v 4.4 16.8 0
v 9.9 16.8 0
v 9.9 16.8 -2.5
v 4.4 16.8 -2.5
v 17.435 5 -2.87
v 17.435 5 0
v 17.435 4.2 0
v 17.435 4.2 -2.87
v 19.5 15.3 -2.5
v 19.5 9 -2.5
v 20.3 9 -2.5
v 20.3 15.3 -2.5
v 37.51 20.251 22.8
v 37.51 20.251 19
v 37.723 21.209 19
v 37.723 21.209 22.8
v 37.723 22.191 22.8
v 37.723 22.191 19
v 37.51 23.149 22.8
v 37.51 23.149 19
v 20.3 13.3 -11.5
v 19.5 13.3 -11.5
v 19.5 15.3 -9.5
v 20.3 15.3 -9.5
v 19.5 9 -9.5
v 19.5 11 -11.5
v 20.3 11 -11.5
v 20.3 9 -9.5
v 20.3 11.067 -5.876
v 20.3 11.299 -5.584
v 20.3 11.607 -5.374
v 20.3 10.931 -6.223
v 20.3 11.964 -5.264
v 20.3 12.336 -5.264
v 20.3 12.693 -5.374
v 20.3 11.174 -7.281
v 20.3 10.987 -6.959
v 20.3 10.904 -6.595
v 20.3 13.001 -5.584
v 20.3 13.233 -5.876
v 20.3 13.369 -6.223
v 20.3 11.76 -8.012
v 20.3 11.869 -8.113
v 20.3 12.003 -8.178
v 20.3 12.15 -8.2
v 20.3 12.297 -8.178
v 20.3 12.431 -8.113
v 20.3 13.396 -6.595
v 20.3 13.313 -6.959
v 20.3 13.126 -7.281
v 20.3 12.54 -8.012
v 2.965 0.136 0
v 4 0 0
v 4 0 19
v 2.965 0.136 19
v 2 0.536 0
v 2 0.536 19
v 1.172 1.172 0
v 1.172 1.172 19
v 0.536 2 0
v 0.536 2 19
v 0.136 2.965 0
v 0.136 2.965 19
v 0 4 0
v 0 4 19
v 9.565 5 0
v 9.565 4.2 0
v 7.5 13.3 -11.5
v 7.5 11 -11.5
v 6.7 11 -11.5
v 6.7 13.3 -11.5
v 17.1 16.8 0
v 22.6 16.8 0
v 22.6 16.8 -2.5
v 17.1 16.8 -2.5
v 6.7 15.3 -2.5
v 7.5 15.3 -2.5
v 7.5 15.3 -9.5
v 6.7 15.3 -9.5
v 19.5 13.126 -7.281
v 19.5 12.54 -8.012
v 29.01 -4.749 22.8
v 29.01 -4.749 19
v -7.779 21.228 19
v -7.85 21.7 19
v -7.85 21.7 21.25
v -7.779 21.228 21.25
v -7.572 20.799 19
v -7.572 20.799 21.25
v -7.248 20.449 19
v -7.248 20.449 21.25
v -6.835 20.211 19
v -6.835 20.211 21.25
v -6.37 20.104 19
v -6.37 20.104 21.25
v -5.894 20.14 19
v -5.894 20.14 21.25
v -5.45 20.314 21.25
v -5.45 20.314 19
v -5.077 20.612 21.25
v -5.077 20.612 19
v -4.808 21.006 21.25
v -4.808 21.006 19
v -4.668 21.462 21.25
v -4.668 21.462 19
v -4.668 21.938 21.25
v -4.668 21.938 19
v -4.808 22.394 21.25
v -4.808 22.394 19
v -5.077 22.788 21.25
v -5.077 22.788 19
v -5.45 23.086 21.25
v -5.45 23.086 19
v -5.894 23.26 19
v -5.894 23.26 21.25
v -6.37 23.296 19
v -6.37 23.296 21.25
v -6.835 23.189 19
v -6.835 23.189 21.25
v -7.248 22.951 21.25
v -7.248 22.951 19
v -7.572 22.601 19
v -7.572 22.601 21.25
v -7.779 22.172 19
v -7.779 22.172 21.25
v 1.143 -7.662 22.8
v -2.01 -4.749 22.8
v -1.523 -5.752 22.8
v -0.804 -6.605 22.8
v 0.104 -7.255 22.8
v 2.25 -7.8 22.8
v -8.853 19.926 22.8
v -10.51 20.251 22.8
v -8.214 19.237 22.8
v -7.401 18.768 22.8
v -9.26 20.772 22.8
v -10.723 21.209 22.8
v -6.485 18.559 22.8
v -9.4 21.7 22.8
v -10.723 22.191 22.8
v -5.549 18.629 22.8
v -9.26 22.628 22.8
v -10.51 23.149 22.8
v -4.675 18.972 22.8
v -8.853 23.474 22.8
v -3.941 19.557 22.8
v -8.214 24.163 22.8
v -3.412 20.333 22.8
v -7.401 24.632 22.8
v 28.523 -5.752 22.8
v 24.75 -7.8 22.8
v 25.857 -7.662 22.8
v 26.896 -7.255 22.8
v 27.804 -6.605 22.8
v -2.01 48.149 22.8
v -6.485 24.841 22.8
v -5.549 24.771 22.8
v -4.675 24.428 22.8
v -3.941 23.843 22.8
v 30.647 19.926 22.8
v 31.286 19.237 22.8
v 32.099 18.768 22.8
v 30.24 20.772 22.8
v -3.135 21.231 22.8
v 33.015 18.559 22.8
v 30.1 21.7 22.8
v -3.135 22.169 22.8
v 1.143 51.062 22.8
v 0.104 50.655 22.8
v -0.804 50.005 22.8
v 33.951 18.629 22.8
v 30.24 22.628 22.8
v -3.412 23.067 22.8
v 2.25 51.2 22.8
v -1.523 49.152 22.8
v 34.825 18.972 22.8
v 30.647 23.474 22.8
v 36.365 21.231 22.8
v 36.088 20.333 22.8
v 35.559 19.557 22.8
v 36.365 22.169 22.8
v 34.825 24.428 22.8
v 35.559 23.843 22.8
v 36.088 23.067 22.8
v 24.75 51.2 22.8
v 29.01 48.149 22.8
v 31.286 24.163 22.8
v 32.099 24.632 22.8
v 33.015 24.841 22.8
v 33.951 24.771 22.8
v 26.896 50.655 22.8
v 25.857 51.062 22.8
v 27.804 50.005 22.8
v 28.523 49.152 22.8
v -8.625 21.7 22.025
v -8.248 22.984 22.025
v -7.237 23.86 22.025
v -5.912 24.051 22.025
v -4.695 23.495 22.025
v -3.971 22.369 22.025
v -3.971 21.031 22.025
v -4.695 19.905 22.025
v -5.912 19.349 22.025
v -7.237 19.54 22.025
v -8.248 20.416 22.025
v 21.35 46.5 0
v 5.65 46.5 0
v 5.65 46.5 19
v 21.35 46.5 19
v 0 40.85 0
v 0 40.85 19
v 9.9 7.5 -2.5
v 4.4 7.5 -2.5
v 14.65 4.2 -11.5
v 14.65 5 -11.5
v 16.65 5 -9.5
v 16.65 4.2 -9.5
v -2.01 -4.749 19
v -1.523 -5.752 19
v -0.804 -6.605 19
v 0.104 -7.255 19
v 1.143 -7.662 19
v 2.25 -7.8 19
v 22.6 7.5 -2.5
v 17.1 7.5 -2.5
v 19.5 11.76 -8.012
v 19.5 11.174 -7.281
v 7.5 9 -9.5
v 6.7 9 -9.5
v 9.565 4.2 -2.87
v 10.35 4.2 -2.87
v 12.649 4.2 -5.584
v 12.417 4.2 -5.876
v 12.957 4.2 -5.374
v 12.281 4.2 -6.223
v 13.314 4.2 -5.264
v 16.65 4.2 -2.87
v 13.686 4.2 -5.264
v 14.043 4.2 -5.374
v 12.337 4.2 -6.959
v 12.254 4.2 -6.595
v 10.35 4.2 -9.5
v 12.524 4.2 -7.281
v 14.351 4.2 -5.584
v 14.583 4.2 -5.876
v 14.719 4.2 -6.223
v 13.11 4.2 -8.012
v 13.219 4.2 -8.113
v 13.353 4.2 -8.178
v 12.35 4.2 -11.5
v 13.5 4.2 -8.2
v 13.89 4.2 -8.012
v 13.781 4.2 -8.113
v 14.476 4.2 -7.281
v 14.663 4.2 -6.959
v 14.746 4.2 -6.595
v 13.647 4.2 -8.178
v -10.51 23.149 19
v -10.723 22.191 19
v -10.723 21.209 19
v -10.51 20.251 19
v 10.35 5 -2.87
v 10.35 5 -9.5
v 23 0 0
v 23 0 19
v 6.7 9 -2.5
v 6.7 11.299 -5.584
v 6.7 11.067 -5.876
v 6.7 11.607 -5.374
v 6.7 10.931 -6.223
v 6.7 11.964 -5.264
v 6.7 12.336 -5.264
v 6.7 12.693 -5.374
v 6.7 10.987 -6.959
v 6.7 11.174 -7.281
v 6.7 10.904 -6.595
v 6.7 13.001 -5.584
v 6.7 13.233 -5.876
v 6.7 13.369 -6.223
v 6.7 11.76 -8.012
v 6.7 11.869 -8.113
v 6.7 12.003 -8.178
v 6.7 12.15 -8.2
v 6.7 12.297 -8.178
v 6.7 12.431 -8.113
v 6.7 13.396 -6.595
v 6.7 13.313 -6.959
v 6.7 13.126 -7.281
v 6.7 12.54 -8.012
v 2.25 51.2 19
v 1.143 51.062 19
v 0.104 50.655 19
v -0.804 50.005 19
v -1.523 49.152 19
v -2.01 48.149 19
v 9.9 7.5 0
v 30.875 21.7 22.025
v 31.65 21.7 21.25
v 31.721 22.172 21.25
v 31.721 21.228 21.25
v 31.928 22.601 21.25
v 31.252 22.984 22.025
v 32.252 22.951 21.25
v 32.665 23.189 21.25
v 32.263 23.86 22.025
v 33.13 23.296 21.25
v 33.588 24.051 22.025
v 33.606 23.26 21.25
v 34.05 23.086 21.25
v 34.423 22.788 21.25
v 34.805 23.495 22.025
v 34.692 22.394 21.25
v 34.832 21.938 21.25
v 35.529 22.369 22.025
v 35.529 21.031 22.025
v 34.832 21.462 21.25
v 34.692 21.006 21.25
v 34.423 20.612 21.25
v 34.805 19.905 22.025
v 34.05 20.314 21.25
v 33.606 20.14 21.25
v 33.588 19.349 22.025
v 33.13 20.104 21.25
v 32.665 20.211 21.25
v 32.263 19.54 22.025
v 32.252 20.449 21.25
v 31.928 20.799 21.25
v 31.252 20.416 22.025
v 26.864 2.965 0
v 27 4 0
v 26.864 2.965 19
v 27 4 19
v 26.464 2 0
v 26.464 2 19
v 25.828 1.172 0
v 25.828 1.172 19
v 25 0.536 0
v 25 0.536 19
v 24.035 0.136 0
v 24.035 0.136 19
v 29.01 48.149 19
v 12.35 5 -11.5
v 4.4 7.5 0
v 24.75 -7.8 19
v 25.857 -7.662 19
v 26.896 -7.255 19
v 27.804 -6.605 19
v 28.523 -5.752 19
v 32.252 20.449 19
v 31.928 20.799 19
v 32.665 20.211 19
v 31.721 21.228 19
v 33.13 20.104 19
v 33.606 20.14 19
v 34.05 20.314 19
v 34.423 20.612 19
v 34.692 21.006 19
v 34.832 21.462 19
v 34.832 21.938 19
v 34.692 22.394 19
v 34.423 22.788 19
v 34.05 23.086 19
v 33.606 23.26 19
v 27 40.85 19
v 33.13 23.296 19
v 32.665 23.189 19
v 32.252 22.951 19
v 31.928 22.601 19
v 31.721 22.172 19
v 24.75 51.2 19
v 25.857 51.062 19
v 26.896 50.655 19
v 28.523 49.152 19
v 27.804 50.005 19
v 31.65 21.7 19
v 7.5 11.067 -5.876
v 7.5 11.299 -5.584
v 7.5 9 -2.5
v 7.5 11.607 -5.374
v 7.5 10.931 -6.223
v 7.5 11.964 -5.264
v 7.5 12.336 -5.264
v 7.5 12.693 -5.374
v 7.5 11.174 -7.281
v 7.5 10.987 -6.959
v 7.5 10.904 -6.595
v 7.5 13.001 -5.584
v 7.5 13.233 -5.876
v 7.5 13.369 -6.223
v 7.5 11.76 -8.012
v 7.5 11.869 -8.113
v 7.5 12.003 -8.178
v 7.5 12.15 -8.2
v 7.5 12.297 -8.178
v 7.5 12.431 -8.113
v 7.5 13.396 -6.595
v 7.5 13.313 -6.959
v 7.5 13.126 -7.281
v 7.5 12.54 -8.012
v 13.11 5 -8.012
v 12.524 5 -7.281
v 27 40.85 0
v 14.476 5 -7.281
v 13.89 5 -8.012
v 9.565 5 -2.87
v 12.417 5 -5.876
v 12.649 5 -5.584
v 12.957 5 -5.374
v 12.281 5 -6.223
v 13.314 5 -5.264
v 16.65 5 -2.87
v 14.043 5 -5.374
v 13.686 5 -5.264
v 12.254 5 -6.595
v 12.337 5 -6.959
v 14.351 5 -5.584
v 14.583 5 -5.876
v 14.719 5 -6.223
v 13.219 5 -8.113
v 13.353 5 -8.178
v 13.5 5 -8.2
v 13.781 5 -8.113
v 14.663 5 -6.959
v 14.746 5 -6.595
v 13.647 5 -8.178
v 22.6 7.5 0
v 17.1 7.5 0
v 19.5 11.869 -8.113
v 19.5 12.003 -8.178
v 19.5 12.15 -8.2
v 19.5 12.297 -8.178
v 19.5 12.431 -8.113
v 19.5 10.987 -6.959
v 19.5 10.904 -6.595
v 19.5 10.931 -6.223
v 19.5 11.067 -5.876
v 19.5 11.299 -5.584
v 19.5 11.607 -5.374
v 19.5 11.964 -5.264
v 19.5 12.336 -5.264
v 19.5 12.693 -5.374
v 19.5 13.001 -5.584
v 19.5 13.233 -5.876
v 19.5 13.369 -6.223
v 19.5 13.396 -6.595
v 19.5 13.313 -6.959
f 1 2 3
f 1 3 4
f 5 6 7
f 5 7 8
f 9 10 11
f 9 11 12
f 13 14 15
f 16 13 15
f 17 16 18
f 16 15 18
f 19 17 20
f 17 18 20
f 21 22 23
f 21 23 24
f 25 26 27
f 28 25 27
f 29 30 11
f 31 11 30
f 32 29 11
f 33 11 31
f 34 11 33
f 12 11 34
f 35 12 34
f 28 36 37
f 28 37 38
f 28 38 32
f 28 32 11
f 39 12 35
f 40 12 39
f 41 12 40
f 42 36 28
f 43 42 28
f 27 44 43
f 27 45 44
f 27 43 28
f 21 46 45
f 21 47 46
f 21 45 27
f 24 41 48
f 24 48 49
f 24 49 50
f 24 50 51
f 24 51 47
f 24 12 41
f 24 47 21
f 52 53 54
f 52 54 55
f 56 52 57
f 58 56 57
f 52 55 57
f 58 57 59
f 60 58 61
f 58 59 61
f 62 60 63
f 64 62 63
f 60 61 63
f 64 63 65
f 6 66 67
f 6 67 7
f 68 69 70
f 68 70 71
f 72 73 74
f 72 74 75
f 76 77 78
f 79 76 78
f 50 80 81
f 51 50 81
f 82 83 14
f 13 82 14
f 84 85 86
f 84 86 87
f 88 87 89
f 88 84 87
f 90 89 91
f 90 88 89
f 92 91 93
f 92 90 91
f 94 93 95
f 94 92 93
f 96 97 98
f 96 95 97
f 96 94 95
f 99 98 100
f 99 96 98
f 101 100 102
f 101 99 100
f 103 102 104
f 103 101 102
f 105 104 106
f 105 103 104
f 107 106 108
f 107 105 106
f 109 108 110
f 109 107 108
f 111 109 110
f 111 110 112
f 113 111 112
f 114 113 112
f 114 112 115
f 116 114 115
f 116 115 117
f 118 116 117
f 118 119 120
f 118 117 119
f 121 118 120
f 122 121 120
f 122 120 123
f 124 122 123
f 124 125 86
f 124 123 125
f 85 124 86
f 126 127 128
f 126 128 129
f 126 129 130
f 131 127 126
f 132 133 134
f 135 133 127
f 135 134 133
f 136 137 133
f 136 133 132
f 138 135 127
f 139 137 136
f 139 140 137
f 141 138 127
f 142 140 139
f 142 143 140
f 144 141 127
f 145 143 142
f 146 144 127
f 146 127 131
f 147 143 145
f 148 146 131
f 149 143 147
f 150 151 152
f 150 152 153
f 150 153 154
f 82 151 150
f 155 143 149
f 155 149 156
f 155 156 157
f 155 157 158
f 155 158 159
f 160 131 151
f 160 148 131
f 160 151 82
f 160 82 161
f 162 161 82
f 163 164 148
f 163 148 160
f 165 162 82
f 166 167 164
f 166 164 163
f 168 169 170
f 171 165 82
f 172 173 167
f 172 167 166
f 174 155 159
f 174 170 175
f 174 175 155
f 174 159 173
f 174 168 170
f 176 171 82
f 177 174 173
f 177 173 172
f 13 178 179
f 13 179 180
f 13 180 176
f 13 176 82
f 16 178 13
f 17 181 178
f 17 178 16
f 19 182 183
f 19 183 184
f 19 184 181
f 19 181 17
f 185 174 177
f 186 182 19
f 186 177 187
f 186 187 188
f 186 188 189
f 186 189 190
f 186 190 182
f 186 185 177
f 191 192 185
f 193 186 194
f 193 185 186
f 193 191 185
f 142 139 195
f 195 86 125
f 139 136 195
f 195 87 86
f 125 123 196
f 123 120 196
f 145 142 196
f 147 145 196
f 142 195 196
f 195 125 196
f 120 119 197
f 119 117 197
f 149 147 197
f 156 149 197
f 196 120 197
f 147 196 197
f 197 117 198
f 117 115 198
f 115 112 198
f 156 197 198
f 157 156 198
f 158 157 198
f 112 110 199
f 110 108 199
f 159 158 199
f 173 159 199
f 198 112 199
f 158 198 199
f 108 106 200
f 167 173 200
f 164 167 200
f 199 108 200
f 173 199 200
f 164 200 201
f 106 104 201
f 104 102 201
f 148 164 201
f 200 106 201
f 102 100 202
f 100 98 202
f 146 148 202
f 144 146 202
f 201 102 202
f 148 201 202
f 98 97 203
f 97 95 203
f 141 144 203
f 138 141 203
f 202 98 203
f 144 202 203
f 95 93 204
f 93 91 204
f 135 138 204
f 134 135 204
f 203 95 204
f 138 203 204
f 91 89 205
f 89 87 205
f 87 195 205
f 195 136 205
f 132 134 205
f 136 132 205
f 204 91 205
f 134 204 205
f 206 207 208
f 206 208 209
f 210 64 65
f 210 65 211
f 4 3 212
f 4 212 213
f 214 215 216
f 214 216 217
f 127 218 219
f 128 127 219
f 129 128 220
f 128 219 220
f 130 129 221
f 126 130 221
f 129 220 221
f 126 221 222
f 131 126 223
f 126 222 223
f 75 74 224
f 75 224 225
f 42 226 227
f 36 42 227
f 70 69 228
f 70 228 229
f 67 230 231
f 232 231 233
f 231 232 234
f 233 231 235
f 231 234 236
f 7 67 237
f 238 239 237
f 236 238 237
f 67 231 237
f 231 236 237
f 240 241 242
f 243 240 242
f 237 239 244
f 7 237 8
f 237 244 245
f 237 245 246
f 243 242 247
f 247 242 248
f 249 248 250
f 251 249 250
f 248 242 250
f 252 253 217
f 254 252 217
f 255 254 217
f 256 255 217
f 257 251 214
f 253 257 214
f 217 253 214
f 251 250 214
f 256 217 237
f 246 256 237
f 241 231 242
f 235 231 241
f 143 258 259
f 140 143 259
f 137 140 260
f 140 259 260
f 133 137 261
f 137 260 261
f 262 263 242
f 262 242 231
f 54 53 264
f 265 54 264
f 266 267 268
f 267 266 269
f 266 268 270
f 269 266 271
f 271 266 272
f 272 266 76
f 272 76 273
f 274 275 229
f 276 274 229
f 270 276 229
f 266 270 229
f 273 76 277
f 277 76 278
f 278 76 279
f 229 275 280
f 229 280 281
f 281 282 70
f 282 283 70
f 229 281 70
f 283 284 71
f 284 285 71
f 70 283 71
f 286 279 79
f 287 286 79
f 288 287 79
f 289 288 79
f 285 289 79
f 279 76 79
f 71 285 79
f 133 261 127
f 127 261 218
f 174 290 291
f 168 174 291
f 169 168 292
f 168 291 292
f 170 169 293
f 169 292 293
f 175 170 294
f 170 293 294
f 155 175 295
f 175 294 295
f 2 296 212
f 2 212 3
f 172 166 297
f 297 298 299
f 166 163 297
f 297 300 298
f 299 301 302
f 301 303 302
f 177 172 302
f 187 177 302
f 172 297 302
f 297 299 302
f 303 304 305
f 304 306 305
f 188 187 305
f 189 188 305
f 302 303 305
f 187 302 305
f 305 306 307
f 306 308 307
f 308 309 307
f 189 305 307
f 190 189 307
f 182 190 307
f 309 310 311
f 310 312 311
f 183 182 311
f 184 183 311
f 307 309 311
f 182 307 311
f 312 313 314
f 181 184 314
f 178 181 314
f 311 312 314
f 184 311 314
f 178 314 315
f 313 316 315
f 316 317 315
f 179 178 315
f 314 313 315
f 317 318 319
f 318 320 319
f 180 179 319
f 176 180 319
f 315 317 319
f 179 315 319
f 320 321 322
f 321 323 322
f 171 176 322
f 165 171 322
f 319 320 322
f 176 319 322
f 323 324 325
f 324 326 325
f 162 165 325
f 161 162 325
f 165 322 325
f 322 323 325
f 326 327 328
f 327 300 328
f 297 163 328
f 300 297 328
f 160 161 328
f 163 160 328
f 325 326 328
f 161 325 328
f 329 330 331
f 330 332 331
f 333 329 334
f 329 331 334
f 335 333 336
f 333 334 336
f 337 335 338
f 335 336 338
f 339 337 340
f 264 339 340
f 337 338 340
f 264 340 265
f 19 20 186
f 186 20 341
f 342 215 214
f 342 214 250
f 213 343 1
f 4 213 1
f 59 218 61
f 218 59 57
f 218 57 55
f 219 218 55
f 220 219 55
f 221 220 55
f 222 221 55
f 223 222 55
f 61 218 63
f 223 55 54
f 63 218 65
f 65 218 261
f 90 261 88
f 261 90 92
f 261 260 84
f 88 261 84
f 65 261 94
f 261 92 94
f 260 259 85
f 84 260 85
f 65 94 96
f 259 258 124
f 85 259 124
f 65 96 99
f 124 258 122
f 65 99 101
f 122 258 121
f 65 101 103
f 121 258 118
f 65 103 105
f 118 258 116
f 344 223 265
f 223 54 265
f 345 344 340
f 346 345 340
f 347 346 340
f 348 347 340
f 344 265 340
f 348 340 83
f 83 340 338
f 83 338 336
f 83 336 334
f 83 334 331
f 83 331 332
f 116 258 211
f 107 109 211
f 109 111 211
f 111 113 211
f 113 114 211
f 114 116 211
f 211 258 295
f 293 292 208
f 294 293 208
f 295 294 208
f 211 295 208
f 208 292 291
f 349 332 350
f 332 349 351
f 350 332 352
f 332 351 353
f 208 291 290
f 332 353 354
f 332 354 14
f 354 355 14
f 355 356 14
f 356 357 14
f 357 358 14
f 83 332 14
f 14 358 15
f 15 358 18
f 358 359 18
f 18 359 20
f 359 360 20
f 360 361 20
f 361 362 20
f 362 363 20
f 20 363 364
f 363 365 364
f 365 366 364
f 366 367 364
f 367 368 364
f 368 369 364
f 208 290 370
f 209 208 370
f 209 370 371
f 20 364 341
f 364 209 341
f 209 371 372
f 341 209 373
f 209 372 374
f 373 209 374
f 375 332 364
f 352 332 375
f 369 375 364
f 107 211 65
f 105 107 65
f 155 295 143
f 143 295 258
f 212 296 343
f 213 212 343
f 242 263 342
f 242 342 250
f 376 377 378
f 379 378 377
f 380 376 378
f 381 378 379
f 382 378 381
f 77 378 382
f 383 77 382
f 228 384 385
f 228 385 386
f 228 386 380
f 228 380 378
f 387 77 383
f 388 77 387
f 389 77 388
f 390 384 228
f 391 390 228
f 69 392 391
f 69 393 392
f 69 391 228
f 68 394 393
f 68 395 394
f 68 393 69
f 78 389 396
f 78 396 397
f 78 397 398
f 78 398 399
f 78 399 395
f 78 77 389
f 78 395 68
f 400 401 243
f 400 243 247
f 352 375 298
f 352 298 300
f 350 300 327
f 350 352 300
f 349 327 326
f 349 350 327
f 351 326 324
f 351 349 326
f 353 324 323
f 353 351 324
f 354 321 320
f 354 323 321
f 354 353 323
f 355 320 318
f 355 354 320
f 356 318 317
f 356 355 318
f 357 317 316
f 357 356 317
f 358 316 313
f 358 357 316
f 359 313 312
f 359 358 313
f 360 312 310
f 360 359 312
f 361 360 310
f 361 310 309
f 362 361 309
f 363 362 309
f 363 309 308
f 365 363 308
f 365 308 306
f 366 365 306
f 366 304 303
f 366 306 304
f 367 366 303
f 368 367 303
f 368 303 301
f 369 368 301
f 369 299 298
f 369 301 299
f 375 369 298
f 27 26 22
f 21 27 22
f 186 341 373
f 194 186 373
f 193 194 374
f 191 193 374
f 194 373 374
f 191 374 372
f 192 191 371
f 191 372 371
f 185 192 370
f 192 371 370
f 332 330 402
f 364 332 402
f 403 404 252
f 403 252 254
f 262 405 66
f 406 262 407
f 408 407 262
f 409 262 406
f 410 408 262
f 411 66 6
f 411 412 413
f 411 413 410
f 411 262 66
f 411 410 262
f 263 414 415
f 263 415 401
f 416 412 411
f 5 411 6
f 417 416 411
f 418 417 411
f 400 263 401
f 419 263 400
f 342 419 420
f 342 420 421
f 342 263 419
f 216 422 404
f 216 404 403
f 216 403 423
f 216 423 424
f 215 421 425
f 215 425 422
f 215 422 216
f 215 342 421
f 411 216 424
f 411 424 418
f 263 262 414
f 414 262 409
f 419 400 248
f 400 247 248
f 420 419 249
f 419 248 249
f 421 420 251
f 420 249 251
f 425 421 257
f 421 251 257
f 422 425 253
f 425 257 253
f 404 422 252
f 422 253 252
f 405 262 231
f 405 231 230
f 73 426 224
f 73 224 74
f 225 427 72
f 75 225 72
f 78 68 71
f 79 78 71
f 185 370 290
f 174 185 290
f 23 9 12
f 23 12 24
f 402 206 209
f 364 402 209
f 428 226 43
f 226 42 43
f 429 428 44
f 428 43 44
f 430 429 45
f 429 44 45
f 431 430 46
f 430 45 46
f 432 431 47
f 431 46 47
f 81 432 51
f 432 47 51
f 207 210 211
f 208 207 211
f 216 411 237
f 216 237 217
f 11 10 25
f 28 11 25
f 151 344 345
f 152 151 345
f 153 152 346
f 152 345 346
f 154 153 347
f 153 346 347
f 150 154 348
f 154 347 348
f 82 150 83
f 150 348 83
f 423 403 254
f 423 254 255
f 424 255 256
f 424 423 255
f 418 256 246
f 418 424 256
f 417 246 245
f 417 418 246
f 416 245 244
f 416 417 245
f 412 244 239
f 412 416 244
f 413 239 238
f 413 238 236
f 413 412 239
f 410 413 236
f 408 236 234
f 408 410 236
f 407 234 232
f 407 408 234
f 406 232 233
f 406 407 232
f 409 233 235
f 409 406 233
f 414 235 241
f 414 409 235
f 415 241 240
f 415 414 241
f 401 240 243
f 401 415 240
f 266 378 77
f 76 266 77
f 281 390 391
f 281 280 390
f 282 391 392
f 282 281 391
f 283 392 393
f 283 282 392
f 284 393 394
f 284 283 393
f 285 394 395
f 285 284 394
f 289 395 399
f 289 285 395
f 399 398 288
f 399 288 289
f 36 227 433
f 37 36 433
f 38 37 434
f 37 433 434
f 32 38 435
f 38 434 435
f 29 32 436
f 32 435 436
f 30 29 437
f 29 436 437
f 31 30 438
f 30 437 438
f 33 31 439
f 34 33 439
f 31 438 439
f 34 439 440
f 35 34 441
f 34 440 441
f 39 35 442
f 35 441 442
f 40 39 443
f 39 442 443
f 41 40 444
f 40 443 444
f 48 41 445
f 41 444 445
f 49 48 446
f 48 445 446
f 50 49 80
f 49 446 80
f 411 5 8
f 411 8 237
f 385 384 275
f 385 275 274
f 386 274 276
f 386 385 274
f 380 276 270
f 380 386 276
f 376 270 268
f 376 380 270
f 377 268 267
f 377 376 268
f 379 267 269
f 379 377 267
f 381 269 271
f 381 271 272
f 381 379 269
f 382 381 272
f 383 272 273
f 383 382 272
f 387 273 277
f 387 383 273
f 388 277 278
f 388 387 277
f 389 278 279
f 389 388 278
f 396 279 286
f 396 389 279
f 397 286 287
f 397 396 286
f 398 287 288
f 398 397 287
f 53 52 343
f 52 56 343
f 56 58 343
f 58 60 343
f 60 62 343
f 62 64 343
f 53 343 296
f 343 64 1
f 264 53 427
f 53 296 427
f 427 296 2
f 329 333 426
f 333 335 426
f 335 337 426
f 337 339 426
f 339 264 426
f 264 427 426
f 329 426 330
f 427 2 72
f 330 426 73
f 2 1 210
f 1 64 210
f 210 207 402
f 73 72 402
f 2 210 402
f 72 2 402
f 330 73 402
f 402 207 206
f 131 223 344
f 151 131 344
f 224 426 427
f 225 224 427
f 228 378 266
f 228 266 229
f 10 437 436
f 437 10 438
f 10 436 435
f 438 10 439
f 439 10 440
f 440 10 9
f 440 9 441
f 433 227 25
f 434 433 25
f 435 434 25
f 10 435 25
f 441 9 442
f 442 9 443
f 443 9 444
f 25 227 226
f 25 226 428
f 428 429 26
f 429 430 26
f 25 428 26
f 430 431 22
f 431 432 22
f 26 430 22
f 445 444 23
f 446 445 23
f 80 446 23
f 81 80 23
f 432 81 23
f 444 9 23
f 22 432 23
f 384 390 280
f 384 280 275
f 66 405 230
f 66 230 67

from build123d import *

# Parameters (mm, degrees)
SKETCH1_W                                       = 27
SKETCH1_H                                       = 46.5
BOSS_EXTRUDE1_DEPTH                             = 19
SKETCH2_R                                       = 1.6
BOSS_EXTRUDE2_DEPTH                             = 3.8
CSK_FOR_M3_FLAT_HEAD_MACHINE_SCREW1_D           = 3.2
CSK_FOR_M3_FLAT_HEAD_MACHINE_SCREW1_CSINK_D     = 6.3
CSK_FOR_M3_FLAT_HEAD_MACHINE_SCREW1_CSINK_ANGLE = 90
SKETCH5_W                                       = 5.5
SKETCH5_H                                       = 9.3
BOSS_EXTRUDE3_DEPTH                             = 2.5
BOSS_EXTRUDE4_DEPTH                             = 0.8
CHAMFER1_SIZE                                   = 2
FILLET1_R                                       = 0.5
SKETCH7_W                                       = 9
SKETCH7_H                                       = 6.3
BOSS_EXTRUDE5_DEPTH                             = 0.8
CHAMFER2_SIZE                                   = 2
FILLET3_R                                       = 0.5
CHAMFER3_SIZE                                   = 5.65
FILLET2_R                                       = 4


with BuildPart() as part:
    # Sketch1 → Boss-Extrude1 (new body)
    with BuildSketch(Plane.XY):
        with Locations((13.5, 23.25)):
            Rectangle(SKETCH1_W, SKETCH1_H)
    extrude(amount=BOSS_EXTRUDE1_DEPTH)

    # Sketch2 → Boss-Extrude2 (add)
    with BuildSketch(Plane.XY.offset(19)):
        with BuildLine():
            Line((2.25, -7.8), (24.75, -7.8))
            ThreePointArc((24.75, -7.8), (27.370254725, -6.958451199), (29.010477352, -4.7485623))
            Line((29.010477352, -4.7485623), (37.510477352, 20.2514377))
            ThreePointArc((37.510477352, 20.2514377), (37.75, 21.7), (37.510477352, 23.1485623))
            Line((37.510477352, 23.1485623), (29.010477352, 48.1485623))
            ThreePointArc((29.010477352, 48.1485623), (27.370254725, 50.358451199), (24.75, 51.2))
            Line((24.75, 51.2), (2.25, 51.2))
            ThreePointArc((2.25, 51.2), (-0.370254725, 50.358451199), (-2.010477352, 48.1485623))
            Line((-2.010477352, 48.1485623), (-10.510477352, 23.1485623))
            ThreePointArc((-10.510477352, 23.1485623), (-10.75, 21.7), (-10.510477352, 20.2514377))
            Line((-10.510477352, 20.2514377), (-2.010477352, -4.7485623))
            ThreePointArc((-2.010477352, -4.7485623), (-0.370254725, -6.958451199), (2.25, -7.8))
        make_face()
        with Locations(Location((-6.25, 21.7, 0), (0, 0, 180))):
            Circle(SKETCH2_R, mode=Mode.SUBTRACT)
        with Locations(Location((33.25, 21.7, 0), (0, 0, 180))):
            Circle(SKETCH2_R, mode=Mode.SUBTRACT)
    extrude(amount=BOSS_EXTRUDE2_DEPTH)

    # CSK for M3 Flat Head Machine Screw1 (through all)
    with Locations(Plane.XY.offset(22.8)):
        with Locations((-6.25, 21.7), (33.25, 21.7)):
            CounterSinkHole(CSK_FOR_M3_FLAT_HEAD_MACHINE_SCREW1_D / 2, CSK_FOR_M3_FLAT_HEAD_MACHINE_SCREW1_CSINK_D / 2, counter_sink_angle=CSK_FOR_M3_FLAT_HEAD_MACHINE_SCREW1_CSINK_ANGLE)

    # Sketch5 → Boss-Extrude3 (add)
    with BuildSketch(Plane(origin=(0, 0, 0), x_dir=(-1, 0, 0), z_dir=(0, 0, -1))):
        with Locations((-19.85, 12.15)):
            Rectangle(SKETCH5_W, SKETCH5_H)
        with Locations((-7.15, 12.15)):
            Rectangle(SKETCH5_W, SKETCH5_H)
    extrude(amount=BOSS_EXTRUDE3_DEPTH)

    # Chamfer3
    chamfer3_edges = [part.edges().sort_by_distance(p)[0] for p in [
        (0, 46.5, 9.5),
        (27, 46.5, 9.5),
    ]]
    chamfer(chamfer3_edges, length=CHAMFER3_SIZE)

    # Fillet2
    fillet2_edges = [part.edges().sort_by_distance(p)[0] for p in [
        (27, 0, 9.5),
        (0, 0, 9.5),
    ]]
    fillet(fillet2_edges, radius=FILLET2_R)


with BuildPart() as body_2:
    # Sketch6 → Boss-Extrude4 (new body)
    with BuildSketch(Plane(origin=(0, 5, 0), x_dir=(-1, 0, 0), z_dir=(0, -1, 0))):
        Polygon((-17.435, 0), (-17.435, 2.87), (-16.65, 2.87), (-16.65, 11.5), (-10.35, 11.5), (-10.35, 2.87), (-9.565, 2.87), (-9.565, 0), align=None)
        with BuildLine():
            Line((-13.5, 8.5), (-14.475780937, 7.28125))
            ThreePointArc((-14.475780937, 7.28125), (-13.5, 5.25), (-12.524219063, 7.28125))
            Line((-12.524219063, 7.28125), (-13.5, 8.5))
        make_face(mode=Mode.SUBTRACT)
    extrude(amount=BOSS_EXTRUDE4_DEPTH)

    # Chamfer1
    chamfer1_edges = [body_2.edges().sort_by_distance(p)[0] for p in [
        (16.65, 4.6, -11.5),
        (10.35, 4.6, -11.5),
    ]]
    chamfer(chamfer1_edges, length=CHAMFER1_SIZE)

    # Fillet1
    fillet1_edges = [body_2.edges().sort_by_distance(p)[0] for p in [
        (13.5, 4.6, -8.5),
    ]]
    fillet(fillet1_edges, radius=FILLET1_R)


with BuildPart() as body_3:
    # Sketch7 → Boss-Extrude5 (new body)
    with BuildSketch(Plane(origin=(19.5, 0, 0), x_dir=(0, 0, -1), z_dir=(1, 0, 0))):
        with Locations((7, 12.15)):
            Rectangle(SKETCH7_W, SKETCH7_H)
        with BuildLine():
            Line((7.28125, 13.125780937), (8.5, 12.15))
            Line((8.5, 12.15), (7.28125, 11.174219063))
            ThreePointArc((7.28125, 11.174219063), (5.25, 12.15), (7.28125, 13.125780937))
        make_face(mode=Mode.SUBTRACT)
    extrude(amount=BOSS_EXTRUDE5_DEPTH)

    # Chamfer2
    chamfer2_edges = [body_3.edges().sort_by_distance(p)[0] for p in [
        (19.9, 15.3, -11.5),
        (19.9, 9, -11.5),
    ]]
    chamfer(chamfer2_edges, length=CHAMFER2_SIZE)

    # Fillet3
    fillet3_edges = [body_3.edges().sort_by_distance(p)[0] for p in [
        (19.9, 12.15, -8.5),
    ]]
    fillet(fillet3_edges, radius=FILLET3_R)


with BuildPart() as body_4:
    # Mirror2: mirrored copy
    add(body_3.part.mirror(Plane(origin=(13.5, 0, 0), x_dir=(0, 0, 1), z_dir=(1, 0, 0))))


solid = Compound([part.part, body_2.part, body_3.part, body_4.part])
